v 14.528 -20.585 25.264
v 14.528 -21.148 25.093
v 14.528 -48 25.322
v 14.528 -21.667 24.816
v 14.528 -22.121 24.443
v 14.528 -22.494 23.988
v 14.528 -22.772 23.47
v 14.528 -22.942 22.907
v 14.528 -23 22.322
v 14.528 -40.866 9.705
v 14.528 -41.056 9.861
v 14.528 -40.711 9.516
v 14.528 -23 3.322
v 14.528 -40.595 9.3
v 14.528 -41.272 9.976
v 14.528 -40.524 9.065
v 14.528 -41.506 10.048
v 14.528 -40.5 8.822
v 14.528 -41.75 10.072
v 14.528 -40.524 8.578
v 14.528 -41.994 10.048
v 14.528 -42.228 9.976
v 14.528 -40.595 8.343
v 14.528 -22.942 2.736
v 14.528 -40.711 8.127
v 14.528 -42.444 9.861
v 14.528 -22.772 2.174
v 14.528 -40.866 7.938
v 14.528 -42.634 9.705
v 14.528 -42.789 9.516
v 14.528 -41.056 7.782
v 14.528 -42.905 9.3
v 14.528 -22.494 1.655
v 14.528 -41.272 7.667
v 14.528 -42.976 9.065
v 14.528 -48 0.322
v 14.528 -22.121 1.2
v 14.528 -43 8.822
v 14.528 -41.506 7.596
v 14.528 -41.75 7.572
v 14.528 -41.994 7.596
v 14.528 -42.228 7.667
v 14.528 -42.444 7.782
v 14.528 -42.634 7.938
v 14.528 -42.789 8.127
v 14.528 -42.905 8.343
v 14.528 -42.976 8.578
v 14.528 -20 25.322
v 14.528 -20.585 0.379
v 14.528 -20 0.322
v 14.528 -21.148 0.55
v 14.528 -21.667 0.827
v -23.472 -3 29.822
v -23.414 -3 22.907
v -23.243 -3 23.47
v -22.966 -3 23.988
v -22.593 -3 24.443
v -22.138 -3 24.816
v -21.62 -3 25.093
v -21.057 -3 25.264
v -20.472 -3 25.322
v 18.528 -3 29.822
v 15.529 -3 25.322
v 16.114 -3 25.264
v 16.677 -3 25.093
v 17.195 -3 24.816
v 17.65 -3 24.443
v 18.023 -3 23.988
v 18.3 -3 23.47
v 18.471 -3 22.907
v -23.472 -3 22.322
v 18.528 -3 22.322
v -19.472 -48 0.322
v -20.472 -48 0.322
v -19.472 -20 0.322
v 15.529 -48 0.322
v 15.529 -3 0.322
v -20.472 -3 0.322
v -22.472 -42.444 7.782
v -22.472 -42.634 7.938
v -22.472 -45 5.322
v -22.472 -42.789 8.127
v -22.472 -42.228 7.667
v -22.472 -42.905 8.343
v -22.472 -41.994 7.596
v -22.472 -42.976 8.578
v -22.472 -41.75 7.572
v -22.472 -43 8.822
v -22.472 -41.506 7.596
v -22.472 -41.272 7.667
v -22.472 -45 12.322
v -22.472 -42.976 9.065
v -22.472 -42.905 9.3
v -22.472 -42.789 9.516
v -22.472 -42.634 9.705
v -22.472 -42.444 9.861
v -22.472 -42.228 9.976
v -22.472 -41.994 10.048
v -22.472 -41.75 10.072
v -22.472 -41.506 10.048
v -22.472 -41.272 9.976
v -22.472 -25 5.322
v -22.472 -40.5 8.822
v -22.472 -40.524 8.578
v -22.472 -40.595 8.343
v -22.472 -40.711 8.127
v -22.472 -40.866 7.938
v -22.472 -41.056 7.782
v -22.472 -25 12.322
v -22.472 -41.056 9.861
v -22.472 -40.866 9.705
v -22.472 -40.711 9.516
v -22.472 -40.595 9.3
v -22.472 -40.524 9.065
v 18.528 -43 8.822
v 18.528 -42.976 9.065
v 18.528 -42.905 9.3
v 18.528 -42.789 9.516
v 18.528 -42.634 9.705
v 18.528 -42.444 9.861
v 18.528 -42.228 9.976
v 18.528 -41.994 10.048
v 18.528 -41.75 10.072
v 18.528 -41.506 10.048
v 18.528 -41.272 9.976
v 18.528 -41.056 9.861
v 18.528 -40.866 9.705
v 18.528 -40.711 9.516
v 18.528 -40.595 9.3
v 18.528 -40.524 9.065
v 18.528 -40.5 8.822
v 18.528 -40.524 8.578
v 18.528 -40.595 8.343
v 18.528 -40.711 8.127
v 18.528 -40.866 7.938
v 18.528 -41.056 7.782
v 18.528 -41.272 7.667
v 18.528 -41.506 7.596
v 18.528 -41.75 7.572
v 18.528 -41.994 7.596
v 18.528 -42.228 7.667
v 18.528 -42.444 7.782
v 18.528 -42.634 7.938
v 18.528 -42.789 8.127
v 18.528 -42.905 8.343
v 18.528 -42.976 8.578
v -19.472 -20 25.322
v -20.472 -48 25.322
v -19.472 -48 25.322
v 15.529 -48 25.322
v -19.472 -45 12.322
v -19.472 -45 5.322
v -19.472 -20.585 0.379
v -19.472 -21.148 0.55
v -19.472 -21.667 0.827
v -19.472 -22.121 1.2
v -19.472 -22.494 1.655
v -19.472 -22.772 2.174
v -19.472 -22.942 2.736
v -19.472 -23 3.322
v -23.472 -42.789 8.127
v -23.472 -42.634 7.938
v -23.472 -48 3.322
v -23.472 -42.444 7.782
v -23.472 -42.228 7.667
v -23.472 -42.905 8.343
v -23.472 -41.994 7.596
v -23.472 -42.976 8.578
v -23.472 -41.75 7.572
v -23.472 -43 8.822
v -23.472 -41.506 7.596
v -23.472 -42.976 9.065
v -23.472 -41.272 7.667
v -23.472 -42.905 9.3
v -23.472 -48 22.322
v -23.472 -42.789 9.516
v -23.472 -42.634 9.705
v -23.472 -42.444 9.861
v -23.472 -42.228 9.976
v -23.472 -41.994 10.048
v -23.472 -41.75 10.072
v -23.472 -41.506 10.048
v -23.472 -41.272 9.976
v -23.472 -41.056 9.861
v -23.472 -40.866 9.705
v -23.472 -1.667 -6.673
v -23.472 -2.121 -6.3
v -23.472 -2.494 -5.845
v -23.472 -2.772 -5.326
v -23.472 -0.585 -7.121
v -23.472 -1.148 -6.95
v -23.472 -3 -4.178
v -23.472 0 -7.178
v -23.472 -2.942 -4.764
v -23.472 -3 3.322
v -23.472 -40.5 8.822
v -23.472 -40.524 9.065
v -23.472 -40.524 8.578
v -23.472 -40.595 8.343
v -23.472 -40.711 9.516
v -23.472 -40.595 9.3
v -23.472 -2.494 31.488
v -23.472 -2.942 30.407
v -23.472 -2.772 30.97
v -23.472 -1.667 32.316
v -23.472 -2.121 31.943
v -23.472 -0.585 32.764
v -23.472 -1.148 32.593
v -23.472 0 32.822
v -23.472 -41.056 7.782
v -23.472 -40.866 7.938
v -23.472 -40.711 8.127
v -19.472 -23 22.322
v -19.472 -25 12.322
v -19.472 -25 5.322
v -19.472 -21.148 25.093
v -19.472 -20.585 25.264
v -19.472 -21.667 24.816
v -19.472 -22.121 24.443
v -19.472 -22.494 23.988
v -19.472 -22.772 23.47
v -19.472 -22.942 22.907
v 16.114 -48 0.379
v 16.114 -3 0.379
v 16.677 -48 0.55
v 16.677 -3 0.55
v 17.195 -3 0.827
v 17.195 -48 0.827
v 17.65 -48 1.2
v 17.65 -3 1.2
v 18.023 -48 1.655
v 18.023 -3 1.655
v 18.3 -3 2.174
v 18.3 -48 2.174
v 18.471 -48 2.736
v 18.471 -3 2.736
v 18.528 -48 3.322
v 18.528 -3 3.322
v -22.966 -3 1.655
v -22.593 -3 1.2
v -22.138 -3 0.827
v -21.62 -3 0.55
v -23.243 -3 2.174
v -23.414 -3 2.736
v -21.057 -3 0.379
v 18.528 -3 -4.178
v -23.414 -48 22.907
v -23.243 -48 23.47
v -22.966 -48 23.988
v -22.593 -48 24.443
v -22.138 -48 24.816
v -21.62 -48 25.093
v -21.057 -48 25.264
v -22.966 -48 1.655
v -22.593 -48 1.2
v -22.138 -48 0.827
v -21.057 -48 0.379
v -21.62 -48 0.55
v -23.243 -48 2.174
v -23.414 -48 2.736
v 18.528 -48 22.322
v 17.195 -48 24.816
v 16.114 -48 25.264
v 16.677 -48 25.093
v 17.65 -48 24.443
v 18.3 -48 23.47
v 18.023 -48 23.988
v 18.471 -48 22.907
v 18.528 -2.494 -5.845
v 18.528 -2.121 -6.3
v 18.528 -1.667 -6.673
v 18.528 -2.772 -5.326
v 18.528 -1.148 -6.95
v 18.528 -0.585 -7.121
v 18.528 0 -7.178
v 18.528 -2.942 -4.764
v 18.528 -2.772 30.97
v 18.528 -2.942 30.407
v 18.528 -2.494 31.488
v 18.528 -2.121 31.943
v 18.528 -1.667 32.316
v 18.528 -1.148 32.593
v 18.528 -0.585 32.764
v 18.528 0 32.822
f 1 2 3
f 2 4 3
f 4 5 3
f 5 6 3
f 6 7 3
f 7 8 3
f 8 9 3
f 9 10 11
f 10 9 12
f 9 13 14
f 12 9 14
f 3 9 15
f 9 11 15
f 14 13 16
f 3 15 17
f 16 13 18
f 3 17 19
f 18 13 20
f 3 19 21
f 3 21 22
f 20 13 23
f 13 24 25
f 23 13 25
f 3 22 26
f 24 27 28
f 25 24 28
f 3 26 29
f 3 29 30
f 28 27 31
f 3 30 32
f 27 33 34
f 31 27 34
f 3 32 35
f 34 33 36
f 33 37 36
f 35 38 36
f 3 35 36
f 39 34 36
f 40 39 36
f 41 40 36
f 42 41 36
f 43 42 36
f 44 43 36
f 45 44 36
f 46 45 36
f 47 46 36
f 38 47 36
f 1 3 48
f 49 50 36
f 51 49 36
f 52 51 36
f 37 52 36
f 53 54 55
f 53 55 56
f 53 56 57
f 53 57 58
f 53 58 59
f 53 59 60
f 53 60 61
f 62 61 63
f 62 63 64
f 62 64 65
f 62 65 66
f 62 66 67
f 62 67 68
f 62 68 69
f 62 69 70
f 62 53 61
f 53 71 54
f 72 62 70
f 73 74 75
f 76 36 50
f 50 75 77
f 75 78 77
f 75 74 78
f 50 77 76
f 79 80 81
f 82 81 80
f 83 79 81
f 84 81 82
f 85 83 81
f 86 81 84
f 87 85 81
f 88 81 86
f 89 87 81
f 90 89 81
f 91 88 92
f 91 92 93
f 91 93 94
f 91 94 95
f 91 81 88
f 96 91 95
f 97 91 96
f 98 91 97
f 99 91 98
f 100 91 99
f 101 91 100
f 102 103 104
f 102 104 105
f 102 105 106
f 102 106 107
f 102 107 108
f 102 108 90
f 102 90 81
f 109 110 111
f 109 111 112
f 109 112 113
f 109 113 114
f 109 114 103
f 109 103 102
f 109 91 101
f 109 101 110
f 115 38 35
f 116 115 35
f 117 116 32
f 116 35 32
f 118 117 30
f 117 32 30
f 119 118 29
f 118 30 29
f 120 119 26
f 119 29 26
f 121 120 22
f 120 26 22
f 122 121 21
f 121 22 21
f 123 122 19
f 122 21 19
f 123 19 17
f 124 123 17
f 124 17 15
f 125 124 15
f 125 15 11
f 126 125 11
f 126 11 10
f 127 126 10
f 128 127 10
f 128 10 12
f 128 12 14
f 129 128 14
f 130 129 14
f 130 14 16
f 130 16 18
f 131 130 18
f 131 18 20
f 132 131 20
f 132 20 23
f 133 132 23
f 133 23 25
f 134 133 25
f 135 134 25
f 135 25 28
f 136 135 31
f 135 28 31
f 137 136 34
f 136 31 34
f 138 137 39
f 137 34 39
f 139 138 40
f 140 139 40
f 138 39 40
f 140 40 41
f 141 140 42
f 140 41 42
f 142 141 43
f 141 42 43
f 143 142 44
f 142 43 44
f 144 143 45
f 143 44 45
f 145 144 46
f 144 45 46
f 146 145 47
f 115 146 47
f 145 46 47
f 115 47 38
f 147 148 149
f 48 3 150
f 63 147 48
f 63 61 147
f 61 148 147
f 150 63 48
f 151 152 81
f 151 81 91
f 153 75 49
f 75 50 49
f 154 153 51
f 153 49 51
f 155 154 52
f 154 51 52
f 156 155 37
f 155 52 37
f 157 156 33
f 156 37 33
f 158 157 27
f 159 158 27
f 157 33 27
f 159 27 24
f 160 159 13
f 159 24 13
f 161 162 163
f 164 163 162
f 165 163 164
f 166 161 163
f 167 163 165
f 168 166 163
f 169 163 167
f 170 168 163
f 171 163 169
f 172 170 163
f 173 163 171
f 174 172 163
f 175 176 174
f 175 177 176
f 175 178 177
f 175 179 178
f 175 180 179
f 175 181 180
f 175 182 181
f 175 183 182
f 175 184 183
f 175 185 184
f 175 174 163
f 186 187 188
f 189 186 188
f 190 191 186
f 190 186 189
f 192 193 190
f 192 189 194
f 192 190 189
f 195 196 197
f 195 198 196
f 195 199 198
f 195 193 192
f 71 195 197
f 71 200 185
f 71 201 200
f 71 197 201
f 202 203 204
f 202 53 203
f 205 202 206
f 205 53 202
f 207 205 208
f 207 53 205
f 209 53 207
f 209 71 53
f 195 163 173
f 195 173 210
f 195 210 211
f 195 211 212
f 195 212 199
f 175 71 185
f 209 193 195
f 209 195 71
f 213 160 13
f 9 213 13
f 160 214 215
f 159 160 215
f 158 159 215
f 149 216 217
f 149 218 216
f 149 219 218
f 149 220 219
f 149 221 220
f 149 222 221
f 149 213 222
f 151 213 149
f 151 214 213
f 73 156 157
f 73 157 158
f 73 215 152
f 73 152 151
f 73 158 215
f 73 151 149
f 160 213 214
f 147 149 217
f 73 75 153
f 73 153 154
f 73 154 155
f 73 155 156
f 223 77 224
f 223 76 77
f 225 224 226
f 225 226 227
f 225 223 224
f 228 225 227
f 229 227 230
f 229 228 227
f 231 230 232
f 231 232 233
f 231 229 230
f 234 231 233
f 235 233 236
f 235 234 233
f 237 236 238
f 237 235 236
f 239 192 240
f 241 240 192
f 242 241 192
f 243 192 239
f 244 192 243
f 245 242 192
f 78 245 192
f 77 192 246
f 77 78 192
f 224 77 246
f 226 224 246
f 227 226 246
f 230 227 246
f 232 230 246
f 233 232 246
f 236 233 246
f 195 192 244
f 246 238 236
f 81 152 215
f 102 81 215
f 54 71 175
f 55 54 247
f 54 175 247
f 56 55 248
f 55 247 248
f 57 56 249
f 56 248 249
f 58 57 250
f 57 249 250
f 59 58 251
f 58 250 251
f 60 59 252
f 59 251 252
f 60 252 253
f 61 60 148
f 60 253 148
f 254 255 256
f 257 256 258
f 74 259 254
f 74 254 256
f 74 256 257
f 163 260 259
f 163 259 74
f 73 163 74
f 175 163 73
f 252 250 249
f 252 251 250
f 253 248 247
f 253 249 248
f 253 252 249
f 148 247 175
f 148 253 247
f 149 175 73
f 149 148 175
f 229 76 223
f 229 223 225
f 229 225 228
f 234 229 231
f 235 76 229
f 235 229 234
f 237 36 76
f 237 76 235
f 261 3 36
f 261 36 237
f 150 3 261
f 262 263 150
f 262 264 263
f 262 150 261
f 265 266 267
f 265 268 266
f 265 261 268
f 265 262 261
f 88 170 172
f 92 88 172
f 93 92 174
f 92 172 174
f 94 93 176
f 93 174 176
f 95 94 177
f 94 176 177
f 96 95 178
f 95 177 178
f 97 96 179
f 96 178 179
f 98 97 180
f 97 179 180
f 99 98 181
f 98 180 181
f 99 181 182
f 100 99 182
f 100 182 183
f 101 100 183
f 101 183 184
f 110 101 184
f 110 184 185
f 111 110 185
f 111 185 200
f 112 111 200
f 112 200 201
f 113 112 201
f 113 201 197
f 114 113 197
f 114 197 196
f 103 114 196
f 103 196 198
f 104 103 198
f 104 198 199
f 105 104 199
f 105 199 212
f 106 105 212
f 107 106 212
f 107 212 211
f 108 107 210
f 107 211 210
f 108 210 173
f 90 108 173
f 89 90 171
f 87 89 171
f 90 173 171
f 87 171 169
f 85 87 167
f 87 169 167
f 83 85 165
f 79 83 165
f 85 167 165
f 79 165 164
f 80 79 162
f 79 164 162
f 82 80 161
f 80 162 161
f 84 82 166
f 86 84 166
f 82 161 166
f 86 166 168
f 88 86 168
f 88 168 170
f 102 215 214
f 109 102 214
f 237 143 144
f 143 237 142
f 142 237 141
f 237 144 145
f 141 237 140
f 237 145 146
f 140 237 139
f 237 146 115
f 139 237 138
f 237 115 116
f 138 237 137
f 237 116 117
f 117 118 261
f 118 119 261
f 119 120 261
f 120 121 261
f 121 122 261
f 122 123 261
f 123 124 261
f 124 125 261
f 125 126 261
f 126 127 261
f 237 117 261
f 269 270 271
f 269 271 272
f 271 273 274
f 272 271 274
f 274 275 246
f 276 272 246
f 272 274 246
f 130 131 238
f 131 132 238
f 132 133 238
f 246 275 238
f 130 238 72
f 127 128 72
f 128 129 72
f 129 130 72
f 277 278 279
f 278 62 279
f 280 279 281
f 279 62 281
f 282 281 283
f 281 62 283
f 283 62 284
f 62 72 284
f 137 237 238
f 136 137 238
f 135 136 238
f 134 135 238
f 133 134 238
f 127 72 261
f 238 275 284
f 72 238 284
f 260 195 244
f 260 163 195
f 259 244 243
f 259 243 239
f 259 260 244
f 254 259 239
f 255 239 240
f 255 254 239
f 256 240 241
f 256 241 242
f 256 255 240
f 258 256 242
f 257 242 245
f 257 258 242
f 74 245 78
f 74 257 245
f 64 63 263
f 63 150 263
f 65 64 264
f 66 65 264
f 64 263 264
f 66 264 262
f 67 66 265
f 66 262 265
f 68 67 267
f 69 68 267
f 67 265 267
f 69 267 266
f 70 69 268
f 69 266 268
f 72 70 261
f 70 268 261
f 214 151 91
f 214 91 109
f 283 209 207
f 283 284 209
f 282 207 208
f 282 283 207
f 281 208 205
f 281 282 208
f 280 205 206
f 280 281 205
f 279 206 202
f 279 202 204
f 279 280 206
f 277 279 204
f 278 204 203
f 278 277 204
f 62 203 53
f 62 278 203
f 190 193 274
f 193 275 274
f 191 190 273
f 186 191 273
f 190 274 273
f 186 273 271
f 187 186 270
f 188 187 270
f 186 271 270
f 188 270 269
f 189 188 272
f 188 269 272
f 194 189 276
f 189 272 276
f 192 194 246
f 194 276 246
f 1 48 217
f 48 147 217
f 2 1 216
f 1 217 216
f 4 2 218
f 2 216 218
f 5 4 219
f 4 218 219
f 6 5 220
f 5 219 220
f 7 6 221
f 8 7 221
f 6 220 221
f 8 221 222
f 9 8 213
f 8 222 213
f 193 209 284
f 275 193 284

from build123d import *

# Parameters (mm, degrees)
F0_W     = 42
F0_H     = 40
F1_DEPTH = 3
F2_W     = 42
F2_H     = 25
F3_DEPTH = 45
F4_W     = 34
F4_H     = 25
F5_DEPTH = 32.501
F6_W     = 20
F6_H     = 7
F7_DEPTH = 3
F8_R     = 1.25
F9_DEPTH = 42.001
F10_R    = 2.99999


# Not quite as in the source:
# - a fillet or chamfer is up to 0.001 mm smaller than in the source, because OpenCascade refuses the exact size


with BuildPart() as f1:
    # F0 (on Front) → F1 (new body)
    with BuildSketch(Plane.XZ):
        with Locations((-2.4715067595, 12.8215752275)):
            Rectangle(F0_W, F0_H)
    extrude(amount=F1_DEPTH)

    # F2 (on face) → F3 (join)
    with BuildSketch(Plane.XZ.offset(3)):
        with Locations((-2.4715067595, 12.8215752275)):
            Rectangle(F2_W, F2_H)
    extrude(amount=F3_DEPTH)

    # F4 (on face) → F5 (cut, through all)
    with BuildSketch(Plane(origin=(0, 0, 0.3215752275), x_dir=(1, 0, 0), z_dir=(0, 0, -1))):
        with Locations((-2.4715067595, 35.5)):
            Rectangle(F4_W, F4_H)
    extrude(amount=-F5_DEPTH, mode=Mode.SUBTRACT)

    # F6 (on face) → F7 (cut)
    with BuildSketch(Plane.YZ.offset(-19.4715067595)):
        with Locations((-35, 8.8215752275)):
            Rectangle(F6_W, F6_H)
    extrude(amount=-F7_DEPTH, mode=Mode.SUBTRACT)

    # F8 (on face) → F9 (cut, through all)
    with BuildSketch(Plane(origin=(-23.4715067595, 0, 0), x_dir=(0, -1, 0), z_dir=(-1, 0, 0))):
        with Locations((41.75, 8.8215752275)):
            Circle(F8_R)
    extrude(amount=-F9_DEPTH, mode=Mode.SUBTRACT)

    # F10 (radius 3 in the source; OpenCascade refuses exactly that, so slightly less here)
    f10_edges = [f1.edges().sort_by_distance(p)[0] for p in [
        (-23.471507, -25.5, 0.321575),
        (18.528493, -25.5, 0.321575),
        (-23.471507, -25.5, 25.321575),
        (18.528493, -25.5, 25.321575),
        (-2.471507, -23, 25.321575),
        (-2.471507, -23, 0.321575),
        (-2.471507, -3, -7.178425),
        (-2.471507, -3, 32.821575),
    ]]
    fillet(f10_edges, radius=F10_R)


solid = f1.part
